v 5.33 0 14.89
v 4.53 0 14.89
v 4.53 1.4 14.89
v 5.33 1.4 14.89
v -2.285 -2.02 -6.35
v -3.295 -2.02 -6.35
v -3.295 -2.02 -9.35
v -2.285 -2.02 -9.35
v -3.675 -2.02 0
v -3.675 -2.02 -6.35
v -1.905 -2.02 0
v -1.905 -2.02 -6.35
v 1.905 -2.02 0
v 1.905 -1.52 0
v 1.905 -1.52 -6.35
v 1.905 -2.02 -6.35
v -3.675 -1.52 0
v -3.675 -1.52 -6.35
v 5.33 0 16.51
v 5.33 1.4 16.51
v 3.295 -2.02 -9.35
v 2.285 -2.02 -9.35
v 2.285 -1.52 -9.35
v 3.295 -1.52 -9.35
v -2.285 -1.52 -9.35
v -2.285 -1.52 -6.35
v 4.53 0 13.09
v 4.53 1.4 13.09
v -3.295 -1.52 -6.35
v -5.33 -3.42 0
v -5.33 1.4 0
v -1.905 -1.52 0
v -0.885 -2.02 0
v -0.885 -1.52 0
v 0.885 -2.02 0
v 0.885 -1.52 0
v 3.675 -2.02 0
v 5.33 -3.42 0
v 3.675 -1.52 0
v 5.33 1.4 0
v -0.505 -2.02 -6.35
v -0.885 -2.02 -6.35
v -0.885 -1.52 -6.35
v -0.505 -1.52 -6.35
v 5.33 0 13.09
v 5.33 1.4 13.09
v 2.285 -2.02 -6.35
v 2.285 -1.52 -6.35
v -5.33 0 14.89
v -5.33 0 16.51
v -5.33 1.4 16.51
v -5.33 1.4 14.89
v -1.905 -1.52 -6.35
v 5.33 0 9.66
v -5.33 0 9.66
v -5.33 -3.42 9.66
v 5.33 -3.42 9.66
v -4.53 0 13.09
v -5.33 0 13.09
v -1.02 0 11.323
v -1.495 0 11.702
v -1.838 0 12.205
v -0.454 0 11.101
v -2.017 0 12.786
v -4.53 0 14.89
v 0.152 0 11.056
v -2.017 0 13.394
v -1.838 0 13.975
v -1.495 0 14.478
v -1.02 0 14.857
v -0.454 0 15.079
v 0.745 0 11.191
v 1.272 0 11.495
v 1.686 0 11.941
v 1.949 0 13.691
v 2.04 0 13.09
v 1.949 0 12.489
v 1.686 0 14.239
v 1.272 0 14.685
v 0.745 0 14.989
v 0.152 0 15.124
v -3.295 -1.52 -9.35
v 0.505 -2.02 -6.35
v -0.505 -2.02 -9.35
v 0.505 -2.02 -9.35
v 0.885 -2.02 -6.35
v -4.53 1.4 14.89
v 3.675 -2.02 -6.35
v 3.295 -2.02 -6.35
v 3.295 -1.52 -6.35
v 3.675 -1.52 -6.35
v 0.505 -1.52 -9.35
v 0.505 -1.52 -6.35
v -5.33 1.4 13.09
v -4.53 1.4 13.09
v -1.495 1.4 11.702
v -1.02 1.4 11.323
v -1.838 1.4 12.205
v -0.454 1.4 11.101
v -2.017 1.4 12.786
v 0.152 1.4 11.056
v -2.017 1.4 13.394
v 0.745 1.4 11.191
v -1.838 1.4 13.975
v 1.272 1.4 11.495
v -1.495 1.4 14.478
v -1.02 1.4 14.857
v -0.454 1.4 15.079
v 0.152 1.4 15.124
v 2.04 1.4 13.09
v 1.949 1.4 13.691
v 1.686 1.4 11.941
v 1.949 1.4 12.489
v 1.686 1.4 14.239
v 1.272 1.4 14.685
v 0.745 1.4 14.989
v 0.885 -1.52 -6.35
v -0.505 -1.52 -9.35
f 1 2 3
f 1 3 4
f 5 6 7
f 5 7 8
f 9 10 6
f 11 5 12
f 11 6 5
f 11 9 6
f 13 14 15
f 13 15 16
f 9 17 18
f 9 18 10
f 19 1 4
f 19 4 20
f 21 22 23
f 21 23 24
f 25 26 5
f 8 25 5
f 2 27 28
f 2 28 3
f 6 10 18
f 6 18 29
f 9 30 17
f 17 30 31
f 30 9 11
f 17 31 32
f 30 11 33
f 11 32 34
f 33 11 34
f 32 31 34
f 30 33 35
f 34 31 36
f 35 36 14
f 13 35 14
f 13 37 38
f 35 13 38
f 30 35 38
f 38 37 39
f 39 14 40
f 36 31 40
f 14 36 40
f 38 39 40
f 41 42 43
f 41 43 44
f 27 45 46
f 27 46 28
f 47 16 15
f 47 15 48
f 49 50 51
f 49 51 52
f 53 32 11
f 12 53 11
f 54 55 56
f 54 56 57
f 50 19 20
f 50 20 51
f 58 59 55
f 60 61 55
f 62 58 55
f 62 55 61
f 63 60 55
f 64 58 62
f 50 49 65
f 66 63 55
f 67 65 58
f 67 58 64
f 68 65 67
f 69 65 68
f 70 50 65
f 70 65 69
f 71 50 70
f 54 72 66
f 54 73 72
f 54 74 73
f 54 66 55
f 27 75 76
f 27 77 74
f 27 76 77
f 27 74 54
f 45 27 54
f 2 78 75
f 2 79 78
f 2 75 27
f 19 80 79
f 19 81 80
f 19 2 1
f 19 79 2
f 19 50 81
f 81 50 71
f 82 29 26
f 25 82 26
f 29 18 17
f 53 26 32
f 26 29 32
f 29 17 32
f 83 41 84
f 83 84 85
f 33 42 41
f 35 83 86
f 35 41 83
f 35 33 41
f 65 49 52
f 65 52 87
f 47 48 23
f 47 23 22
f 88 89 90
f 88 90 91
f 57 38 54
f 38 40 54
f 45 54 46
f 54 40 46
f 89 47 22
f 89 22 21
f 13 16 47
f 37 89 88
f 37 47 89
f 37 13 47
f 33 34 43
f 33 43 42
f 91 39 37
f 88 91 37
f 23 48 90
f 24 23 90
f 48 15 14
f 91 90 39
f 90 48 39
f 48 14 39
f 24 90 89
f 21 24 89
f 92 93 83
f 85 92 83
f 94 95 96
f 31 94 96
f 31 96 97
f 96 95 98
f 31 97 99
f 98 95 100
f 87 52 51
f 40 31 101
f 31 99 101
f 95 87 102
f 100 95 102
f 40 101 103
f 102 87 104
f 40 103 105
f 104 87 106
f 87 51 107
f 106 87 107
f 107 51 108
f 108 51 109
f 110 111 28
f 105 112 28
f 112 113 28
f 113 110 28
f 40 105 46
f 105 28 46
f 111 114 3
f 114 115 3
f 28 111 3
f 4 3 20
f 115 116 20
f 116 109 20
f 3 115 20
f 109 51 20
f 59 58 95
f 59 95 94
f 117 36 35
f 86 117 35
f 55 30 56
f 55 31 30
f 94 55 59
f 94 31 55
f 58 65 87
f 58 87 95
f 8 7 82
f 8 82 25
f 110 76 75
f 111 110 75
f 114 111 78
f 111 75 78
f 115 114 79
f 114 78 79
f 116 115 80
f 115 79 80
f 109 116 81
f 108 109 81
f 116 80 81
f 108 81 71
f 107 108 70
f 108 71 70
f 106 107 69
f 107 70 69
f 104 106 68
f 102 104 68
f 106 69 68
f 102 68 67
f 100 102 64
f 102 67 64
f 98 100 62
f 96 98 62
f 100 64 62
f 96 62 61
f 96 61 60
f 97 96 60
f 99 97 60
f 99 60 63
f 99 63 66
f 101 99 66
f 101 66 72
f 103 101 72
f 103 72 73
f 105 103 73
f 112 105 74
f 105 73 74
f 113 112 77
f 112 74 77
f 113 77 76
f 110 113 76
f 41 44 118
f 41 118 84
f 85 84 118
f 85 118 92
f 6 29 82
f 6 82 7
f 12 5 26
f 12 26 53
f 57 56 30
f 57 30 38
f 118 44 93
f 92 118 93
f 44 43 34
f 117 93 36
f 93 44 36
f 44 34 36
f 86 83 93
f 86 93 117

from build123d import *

# Parameters (mm, degrees)
F0_R     = 2.04
F1_DEPTH = 1.4
F2_W     = 10.66
F2_H     = 9.66
F3_DEPTH = 3.42
F4_W     = 1.77
F4_H     = 0.5
F5_DEPTH = 6.35
F6_W     = 1.01
F6_H     = 0.5
F7_DEPTH = 3


with BuildPart() as f1:
    # F0 (on Front) → F1 (new body)
    with BuildSketch(Plane.XZ):
        Polygon((5.33, 16.51), (-5.33, 16.51), (-5.33, 14.89), (-4.53, 14.89), (-4.53, 13.09), (-5.33, 13.09), (-5.33, 0), (5.33, 0), (5.33, 13.09), (4.53, 13.09), (4.53, 14.89), (5.33, 14.89), align=None)
        with Locations((0, 13.09)):
            Circle(F0_R, mode=Mode.SUBTRACT)
    extrude(amount=-F1_DEPTH)

    # F2 (on face) → F3 (join)
    with BuildSketch(Plane.XZ):
        with Locations((0, 4.83)):
            Rectangle(F2_W, F2_H)
    extrude(amount=F3_DEPTH)

    # F4 (on face) → F5 (join)
    with BuildSketch(Plane(origin=(0, 0, 0), x_dir=(1, 0, 0), z_dir=(0, 0, -1))):
        with Locations((-2.79, 1.77)):
            Rectangle(F4_W, F4_H)
        with Locations((0, 1.77)):
            Rectangle(F4_W, F4_H)
        with Locations((2.79, 1.77)):
            Rectangle(F4_W, F4_H)
    extrude(amount=F5_DEPTH)

    # F6 (on face) → F7 (join)
    with BuildSketch(Plane(origin=(0, 0, -6.35), x_dir=(1, 0, 0), z_dir=(0, 0, -1))):
        with Locations((-2.79, 1.77)):
            Rectangle(F6_W, F6_H)
        with Locations((0, 1.77)):
            Rectangle(F6_W, F6_H)
        with Locations((2.79, 1.77)):
            Rectangle(F6_W, F6_H)
    extrude(amount=F7_DEPTH)


solid = f1.part
